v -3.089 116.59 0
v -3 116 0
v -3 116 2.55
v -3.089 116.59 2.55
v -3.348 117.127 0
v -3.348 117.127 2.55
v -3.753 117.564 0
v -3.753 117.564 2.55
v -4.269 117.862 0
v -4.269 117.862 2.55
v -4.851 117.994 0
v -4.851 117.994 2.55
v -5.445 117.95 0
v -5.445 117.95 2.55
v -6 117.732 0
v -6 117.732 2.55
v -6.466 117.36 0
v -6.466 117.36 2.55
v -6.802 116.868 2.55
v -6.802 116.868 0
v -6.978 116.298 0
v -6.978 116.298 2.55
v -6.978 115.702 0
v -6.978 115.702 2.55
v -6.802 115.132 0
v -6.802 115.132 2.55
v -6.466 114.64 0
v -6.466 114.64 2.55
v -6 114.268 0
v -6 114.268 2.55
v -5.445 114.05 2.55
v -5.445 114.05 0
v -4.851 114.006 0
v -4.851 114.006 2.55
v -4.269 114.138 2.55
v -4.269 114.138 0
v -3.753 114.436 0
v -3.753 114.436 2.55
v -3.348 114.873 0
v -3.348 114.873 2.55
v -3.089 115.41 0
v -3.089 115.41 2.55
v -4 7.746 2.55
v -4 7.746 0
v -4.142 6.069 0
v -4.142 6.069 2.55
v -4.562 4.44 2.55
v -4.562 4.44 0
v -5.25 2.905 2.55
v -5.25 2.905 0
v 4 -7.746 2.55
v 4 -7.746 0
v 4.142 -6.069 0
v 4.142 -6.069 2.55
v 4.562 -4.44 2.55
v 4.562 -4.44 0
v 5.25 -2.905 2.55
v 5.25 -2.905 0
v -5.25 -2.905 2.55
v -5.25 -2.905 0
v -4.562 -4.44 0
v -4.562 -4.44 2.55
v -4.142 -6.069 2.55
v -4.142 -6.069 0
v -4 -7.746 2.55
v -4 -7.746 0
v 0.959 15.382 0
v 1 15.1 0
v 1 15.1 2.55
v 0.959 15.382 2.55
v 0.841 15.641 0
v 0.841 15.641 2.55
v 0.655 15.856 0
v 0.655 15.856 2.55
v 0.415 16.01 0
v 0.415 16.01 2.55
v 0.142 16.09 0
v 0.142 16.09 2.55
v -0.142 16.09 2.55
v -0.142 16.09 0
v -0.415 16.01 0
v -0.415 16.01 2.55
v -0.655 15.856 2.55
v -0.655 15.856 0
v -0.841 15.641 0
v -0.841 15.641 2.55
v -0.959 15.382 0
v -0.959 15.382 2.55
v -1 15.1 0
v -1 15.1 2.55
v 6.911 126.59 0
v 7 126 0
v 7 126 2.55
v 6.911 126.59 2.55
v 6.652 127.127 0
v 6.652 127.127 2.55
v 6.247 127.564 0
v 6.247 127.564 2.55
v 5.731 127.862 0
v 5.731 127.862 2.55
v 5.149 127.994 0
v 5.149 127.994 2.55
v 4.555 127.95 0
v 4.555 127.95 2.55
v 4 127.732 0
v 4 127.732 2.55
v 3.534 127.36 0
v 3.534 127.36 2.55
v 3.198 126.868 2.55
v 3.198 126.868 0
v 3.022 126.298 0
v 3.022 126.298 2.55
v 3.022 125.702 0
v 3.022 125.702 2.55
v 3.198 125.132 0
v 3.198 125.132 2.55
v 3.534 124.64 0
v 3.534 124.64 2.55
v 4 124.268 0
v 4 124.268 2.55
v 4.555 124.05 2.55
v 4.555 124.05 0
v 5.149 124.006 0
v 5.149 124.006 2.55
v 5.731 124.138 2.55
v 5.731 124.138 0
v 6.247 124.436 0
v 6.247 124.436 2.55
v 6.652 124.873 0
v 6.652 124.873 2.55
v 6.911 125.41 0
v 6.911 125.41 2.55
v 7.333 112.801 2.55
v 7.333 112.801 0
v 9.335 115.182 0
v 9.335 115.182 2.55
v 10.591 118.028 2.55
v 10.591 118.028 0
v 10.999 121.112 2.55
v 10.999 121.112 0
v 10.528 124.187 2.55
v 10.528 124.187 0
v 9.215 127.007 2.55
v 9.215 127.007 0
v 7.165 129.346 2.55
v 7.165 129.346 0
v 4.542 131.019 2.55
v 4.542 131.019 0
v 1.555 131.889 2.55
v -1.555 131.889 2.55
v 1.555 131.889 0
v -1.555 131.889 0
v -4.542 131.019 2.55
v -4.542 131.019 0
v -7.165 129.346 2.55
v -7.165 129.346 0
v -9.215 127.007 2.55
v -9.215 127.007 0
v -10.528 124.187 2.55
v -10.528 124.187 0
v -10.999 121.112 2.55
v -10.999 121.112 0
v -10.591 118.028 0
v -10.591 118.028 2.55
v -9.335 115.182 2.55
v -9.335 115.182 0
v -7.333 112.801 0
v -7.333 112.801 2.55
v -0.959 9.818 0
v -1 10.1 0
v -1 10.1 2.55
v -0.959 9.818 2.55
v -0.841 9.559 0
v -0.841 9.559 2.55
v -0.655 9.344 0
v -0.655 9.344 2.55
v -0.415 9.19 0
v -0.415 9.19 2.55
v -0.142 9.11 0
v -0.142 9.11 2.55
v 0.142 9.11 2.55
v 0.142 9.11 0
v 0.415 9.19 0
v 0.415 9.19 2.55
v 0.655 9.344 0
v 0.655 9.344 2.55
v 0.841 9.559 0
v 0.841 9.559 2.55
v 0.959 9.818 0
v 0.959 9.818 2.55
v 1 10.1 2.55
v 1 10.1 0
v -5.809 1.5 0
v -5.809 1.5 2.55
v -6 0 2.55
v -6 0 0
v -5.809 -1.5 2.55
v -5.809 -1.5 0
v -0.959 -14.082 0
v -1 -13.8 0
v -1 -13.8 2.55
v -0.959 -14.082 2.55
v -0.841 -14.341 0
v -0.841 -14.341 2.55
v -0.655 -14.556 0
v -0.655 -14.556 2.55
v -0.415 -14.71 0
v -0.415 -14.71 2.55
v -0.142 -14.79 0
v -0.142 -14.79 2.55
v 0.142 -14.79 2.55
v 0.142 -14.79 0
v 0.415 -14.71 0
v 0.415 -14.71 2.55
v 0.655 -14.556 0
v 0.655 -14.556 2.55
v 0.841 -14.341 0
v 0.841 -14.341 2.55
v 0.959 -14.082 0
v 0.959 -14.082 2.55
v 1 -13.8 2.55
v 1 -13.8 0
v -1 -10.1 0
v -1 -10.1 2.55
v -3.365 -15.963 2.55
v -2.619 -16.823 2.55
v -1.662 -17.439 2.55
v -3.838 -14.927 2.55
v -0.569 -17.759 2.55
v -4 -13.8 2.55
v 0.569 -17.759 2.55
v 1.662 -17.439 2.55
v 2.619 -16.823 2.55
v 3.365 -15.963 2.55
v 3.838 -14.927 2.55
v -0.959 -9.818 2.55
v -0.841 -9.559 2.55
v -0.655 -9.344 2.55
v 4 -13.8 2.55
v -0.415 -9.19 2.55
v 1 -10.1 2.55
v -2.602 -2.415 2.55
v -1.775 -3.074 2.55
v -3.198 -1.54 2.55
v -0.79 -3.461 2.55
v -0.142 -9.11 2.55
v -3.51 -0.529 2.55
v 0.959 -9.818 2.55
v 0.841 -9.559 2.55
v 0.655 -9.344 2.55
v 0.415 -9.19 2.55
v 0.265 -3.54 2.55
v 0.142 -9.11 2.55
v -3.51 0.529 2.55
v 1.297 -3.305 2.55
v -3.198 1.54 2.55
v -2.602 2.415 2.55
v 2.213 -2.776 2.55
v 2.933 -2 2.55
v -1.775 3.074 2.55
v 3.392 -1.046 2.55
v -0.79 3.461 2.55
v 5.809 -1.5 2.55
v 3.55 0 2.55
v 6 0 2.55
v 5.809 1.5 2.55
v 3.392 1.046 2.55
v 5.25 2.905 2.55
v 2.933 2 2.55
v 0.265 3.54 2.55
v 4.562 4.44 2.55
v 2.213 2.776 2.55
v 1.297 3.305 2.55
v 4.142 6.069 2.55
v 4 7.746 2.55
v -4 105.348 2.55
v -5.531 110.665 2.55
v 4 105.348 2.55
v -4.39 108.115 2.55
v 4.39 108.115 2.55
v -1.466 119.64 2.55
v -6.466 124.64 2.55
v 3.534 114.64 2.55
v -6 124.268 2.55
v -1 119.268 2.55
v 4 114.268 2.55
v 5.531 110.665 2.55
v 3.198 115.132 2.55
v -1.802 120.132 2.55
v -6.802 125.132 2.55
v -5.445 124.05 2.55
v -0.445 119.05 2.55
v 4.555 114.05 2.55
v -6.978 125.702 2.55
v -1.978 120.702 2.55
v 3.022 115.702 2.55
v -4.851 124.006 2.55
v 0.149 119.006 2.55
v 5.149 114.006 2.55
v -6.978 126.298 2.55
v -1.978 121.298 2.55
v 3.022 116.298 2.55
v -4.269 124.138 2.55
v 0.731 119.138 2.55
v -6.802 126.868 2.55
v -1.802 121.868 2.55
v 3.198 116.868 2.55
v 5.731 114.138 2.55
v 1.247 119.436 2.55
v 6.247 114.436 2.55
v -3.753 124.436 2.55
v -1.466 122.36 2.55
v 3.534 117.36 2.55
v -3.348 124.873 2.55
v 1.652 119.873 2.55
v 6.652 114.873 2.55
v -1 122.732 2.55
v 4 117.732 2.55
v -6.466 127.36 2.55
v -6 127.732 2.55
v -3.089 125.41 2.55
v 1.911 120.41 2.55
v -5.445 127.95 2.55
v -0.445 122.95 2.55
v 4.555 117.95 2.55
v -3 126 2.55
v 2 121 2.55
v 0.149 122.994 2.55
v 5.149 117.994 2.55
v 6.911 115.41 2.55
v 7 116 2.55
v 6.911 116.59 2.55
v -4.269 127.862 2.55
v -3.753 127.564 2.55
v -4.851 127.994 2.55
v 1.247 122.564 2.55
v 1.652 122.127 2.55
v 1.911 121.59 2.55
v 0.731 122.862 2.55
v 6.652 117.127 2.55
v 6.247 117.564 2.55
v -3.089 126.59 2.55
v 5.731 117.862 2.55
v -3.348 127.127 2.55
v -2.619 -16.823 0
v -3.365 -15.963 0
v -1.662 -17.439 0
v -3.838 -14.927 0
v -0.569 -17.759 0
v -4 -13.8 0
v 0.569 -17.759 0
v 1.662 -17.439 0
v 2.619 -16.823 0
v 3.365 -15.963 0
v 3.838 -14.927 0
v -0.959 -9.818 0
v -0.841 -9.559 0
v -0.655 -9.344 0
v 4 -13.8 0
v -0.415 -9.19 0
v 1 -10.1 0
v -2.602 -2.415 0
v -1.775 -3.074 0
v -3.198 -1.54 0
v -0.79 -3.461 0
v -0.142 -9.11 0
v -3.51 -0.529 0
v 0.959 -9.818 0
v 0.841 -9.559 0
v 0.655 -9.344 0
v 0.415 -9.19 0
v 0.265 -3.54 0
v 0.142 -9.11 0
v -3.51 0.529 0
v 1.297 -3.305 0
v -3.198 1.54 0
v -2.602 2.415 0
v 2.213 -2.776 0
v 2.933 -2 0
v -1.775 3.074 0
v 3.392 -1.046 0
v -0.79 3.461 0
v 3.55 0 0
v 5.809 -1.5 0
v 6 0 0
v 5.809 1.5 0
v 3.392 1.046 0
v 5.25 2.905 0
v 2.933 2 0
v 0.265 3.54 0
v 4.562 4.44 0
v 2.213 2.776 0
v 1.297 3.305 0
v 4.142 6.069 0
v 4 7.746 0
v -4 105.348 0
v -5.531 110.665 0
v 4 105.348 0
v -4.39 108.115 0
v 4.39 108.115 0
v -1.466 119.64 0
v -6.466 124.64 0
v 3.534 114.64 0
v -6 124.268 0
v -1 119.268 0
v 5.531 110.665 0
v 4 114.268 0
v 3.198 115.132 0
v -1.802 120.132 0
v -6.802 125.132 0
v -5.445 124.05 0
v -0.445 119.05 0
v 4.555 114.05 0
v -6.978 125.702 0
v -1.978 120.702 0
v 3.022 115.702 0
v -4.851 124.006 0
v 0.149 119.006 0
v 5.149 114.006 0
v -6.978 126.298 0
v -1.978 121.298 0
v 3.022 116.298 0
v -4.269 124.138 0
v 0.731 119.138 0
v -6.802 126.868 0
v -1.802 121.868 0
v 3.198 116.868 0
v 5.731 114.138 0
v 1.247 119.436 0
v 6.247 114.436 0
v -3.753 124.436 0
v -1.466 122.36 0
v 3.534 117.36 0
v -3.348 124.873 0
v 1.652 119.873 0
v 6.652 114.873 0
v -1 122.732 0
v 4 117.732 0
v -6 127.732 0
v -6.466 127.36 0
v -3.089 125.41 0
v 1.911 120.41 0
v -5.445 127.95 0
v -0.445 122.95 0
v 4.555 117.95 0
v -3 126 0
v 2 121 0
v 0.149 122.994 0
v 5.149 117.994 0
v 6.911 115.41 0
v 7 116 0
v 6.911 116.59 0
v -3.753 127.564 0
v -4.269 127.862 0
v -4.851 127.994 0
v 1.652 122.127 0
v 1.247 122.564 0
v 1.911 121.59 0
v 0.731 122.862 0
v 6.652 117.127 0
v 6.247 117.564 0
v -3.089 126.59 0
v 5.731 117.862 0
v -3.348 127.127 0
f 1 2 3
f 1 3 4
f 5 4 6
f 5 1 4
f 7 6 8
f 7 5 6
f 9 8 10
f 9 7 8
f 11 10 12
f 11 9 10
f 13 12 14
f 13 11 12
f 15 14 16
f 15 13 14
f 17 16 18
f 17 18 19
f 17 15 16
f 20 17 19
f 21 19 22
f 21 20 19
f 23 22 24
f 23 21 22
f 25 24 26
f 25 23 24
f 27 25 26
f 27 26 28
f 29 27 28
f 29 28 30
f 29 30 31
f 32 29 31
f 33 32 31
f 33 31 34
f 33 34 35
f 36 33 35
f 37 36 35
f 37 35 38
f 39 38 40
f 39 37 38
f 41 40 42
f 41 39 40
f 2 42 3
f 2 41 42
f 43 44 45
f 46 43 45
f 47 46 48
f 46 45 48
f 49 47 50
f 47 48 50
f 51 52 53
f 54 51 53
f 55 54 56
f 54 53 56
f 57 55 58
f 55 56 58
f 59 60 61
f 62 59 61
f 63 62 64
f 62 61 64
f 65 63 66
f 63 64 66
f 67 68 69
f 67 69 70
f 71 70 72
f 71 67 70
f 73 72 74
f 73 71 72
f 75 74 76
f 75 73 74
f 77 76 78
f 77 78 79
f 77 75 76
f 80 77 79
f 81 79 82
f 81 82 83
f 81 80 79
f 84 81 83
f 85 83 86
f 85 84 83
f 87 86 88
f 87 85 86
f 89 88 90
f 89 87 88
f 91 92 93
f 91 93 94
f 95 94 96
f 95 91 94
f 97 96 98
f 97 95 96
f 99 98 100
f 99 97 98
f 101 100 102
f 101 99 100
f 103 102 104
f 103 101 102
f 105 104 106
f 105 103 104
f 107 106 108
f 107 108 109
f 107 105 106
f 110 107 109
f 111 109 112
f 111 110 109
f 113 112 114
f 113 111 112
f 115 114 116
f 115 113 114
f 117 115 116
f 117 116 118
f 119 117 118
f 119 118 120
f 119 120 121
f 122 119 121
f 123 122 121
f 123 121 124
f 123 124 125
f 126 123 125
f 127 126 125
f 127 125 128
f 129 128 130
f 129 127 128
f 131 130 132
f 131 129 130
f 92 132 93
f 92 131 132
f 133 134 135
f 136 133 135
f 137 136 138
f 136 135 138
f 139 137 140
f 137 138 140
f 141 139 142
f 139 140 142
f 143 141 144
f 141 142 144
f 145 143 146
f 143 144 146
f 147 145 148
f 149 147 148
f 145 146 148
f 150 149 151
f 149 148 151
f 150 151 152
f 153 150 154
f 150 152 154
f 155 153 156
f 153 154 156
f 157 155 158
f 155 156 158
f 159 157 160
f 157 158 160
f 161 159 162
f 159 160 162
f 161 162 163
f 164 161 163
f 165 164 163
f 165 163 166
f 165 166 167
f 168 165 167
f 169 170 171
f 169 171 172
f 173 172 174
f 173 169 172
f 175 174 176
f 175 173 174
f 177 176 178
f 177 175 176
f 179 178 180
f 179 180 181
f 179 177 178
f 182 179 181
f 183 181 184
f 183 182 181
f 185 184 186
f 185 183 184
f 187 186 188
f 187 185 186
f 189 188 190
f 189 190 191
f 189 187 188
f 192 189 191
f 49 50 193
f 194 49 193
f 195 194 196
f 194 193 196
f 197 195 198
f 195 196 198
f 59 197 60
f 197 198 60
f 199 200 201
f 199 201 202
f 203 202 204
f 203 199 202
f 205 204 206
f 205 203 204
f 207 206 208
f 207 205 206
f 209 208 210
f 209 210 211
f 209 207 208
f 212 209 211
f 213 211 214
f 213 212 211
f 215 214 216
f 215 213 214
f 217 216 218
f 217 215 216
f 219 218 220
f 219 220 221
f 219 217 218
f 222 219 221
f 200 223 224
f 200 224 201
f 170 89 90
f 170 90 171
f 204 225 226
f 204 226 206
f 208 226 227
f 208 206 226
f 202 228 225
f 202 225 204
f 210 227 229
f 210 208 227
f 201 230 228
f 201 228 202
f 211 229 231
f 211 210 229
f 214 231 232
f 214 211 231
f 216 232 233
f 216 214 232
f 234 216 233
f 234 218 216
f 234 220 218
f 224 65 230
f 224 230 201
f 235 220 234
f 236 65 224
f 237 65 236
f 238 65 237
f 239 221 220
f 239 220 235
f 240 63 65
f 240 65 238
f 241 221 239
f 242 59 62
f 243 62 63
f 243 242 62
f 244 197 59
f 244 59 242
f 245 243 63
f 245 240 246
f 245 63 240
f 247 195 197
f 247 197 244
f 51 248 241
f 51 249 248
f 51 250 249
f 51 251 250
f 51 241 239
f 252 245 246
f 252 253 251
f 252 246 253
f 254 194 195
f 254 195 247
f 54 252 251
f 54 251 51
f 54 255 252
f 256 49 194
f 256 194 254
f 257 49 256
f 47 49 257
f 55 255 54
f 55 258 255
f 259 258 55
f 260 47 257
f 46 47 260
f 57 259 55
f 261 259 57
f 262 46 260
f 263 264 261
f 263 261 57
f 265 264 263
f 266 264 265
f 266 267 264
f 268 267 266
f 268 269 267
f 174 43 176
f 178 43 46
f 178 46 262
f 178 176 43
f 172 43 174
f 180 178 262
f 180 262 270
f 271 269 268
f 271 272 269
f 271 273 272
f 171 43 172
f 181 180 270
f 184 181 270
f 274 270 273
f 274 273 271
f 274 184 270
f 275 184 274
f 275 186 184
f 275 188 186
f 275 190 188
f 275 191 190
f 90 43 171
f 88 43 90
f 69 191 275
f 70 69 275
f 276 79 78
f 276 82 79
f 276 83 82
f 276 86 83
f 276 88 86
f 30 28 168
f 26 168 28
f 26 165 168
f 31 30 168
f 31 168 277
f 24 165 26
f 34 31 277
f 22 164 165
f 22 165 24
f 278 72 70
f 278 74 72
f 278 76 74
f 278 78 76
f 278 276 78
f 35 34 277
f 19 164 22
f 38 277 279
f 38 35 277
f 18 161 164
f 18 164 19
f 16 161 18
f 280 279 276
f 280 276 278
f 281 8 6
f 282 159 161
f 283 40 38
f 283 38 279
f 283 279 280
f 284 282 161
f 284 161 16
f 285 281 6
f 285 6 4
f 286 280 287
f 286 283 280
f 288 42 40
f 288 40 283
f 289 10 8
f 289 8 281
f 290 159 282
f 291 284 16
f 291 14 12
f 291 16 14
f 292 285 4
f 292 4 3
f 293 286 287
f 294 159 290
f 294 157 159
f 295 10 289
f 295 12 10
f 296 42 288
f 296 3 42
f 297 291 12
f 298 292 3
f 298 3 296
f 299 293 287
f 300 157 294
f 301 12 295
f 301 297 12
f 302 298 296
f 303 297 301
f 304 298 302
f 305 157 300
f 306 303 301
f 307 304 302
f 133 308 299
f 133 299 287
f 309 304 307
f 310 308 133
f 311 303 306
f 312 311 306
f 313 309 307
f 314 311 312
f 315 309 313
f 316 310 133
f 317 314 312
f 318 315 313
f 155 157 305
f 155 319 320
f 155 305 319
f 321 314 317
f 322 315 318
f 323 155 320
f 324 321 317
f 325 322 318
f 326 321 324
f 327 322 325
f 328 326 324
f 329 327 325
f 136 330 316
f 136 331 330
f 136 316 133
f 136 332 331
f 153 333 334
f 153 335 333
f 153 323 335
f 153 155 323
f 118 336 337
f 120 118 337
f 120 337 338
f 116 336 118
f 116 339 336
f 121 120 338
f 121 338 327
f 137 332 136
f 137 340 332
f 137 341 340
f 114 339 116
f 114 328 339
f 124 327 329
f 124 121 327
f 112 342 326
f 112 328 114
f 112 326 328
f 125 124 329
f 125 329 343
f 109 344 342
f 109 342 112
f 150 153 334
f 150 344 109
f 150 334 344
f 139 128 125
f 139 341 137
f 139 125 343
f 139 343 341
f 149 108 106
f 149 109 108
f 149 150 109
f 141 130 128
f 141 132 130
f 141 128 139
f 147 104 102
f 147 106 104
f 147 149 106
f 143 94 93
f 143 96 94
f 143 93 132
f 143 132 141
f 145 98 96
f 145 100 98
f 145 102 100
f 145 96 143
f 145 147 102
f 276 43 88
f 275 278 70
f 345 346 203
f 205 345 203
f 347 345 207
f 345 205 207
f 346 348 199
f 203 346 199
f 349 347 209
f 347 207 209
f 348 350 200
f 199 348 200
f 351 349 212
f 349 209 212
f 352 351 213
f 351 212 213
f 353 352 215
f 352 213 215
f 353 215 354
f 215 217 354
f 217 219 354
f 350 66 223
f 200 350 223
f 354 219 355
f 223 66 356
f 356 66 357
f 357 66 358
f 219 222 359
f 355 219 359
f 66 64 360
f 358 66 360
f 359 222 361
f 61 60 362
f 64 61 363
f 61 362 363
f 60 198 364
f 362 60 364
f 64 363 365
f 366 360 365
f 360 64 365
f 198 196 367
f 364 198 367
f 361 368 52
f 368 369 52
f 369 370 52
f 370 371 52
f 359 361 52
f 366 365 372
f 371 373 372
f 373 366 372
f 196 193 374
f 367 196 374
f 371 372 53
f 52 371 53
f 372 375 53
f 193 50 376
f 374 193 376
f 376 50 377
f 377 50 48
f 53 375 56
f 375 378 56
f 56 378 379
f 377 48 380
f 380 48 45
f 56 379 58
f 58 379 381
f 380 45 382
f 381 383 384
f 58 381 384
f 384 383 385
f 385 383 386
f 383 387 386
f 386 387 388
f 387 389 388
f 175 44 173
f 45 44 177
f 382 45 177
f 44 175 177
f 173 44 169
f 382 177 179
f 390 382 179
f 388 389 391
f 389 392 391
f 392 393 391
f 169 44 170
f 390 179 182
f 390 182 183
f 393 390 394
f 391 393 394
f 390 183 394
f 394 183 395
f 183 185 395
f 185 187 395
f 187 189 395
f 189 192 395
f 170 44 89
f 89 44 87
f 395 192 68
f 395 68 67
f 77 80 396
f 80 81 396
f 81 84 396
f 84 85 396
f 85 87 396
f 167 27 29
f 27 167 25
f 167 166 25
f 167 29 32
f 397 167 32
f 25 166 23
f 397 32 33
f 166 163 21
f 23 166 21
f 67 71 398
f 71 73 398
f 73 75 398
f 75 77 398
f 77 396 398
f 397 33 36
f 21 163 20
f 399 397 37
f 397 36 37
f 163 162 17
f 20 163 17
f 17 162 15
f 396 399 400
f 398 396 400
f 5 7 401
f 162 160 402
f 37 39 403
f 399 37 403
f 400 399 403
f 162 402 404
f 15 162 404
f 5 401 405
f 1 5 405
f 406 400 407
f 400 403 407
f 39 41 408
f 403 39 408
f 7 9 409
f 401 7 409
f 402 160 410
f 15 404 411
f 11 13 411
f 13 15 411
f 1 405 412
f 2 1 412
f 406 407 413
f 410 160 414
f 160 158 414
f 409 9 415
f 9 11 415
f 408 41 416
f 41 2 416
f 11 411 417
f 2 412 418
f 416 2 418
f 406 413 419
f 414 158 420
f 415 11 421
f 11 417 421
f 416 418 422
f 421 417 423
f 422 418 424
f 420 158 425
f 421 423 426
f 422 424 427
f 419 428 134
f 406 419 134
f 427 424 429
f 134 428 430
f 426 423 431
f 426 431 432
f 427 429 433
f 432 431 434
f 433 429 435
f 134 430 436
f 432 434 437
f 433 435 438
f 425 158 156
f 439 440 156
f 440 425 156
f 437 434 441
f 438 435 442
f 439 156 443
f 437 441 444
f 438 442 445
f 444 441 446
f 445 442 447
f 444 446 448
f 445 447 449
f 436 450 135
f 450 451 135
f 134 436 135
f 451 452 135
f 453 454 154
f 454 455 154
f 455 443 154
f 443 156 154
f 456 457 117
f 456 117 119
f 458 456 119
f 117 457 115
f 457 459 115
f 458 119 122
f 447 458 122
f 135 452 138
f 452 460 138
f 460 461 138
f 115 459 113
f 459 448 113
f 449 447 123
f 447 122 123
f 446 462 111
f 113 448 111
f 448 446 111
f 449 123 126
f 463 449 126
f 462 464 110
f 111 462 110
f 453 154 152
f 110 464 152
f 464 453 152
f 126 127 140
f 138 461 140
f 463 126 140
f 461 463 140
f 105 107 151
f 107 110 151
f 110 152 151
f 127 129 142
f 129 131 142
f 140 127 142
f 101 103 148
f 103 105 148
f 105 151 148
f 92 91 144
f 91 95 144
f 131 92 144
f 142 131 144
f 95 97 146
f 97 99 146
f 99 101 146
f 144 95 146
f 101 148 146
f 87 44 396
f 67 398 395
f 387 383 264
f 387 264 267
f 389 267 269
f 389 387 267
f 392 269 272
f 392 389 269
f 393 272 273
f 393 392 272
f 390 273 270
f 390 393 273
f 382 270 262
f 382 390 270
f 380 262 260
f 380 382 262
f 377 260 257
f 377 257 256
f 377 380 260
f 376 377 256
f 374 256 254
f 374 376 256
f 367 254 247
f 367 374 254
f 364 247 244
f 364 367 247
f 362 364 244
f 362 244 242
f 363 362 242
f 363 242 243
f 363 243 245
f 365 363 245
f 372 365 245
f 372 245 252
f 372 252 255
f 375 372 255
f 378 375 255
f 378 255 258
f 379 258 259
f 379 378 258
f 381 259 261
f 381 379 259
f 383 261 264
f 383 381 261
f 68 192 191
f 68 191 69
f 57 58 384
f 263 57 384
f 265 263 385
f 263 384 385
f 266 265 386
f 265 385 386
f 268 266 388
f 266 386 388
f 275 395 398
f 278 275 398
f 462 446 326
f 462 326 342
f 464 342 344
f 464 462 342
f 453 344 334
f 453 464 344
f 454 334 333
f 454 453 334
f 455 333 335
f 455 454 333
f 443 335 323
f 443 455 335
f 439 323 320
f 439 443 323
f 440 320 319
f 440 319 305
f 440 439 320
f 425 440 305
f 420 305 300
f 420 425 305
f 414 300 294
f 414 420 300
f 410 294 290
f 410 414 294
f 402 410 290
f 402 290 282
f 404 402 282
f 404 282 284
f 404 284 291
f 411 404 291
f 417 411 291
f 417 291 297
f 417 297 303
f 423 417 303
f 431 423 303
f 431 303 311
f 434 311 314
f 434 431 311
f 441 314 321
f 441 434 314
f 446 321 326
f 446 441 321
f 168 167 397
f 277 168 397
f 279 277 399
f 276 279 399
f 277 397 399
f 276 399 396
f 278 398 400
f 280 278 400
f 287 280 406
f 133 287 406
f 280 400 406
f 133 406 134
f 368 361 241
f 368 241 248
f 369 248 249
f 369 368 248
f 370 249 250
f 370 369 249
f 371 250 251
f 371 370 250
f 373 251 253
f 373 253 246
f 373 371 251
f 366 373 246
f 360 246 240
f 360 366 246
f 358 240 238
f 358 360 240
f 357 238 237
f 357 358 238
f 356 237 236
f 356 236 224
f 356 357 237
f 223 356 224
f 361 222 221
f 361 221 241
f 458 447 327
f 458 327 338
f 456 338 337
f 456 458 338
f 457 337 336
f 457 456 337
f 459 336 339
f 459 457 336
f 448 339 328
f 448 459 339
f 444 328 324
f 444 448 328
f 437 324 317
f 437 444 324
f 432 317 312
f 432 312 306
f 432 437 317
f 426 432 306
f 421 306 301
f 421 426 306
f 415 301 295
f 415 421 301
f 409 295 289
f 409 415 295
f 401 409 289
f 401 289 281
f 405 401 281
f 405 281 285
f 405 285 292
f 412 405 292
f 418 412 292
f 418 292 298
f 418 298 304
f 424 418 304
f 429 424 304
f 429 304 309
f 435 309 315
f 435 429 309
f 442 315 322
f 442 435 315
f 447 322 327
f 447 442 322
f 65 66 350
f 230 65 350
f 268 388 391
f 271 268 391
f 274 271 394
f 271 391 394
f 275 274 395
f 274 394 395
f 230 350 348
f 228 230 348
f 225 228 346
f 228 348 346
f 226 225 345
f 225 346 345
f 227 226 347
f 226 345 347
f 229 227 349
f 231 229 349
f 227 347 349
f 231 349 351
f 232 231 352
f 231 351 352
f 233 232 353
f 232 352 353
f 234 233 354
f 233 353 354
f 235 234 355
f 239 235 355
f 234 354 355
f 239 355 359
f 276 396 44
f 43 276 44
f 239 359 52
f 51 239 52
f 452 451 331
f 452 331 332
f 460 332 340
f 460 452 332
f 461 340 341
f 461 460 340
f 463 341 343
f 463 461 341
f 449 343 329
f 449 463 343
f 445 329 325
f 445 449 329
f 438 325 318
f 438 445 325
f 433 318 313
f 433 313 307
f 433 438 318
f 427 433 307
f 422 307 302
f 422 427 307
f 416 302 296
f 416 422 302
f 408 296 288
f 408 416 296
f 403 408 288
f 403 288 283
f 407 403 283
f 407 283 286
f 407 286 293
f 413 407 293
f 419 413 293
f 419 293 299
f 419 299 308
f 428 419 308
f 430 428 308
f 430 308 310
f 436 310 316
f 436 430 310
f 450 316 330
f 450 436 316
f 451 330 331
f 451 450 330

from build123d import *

# Parameters (mm, degrees)
MODEL_R             = 3.55
MODEL_R_2           = 2
BOSS_EXTRUDE1_DEPTH = 2.55


with BuildPart() as part:
    # Model → Boss-Extrude1 (new body)
    with BuildSketch(Plane.XY):
        with BuildLine():
            Line((-4, 105.347524158), (-4, 7.745966692))
            ThreePointArc((-4, 7.745966692), (-4.317541634, 5.245966692), (-5.25, 2.90473751))
            ThreePointArc((-5.25, 2.90473751), (-6, 0), (-5.25, -2.90473751))
            ThreePointArc((-5.25, -2.90473751), (-4.317541634, -5.245966692), (-4, -7.745966692))
            Line((-4, -7.745966692), (-4, -13.8))
            ThreePointArc((-4, -13.8), (0, -17.8), (4, -13.8))
            Line((4, -13.8), (4, -7.745966692))
            ThreePointArc((4, -7.745966692), (4.317541634, -5.245966692), (5.25, -2.90473751))
            ThreePointArc((5.25, -2.90473751), (6, 0), (5.25, 2.90473751))
            ThreePointArc((5.25, 2.90473751), (4.317541634, 5.245966692), (4, 7.745966692))
            Line((4, 7.745966692), (4, 105.347524158))
            ThreePointArc((4, 105.347524158), (4.871290708, 109.430007062), (7.333333333, 112.801084083))
            ThreePointArc((7.333333333, 112.801084083), (0, 132), (-7.333333333, 112.801084083))
            ThreePointArc((-7.333333333, 112.801084083), (-4.871290708, 109.430007062), (-4, 105.347524158))
        make_face()
        Circle(MODEL_R, mode=Mode.SUBTRACT)
        with Locations((0, 121)):
            Circle(MODEL_R_2, mode=Mode.SUBTRACT)
        with Locations((-5, 126)):
            Circle(MODEL_R_2, mode=Mode.SUBTRACT)
        with Locations((5, 126)):
            Circle(MODEL_R_2, mode=Mode.SUBTRACT)
        with Locations((5, 116)):
            Circle(MODEL_R_2, mode=Mode.SUBTRACT)
        with Locations((-5, 116)):
            Circle(MODEL_R_2, mode=Mode.SUBTRACT)
        with BuildLine():
            Line((-1, -10.1), (-1, -13.8))
            ThreePointArc((-1, -13.8), (0, -14.8), (1, -13.8))
            Line((1, -13.8), (1, -10.1))
            ThreePointArc((1, -10.1), (0, -9.1), (-1, -10.1))
        make_face(mode=Mode.SUBTRACT)
        with BuildLine():
            Line((-1, 15.1), (-1, 10.1))
            ThreePointArc((-1, 10.1), (0, 9.1), (1, 10.1))
            Line((1, 10.1), (1, 15.1))
            ThreePointArc((1, 15.1), (0, 16.1), (-1, 15.1))
        make_face(mode=Mode.SUBTRACT)
    extrude(amount=BOSS_EXTRUDE1_DEPTH)


solid = part.part
